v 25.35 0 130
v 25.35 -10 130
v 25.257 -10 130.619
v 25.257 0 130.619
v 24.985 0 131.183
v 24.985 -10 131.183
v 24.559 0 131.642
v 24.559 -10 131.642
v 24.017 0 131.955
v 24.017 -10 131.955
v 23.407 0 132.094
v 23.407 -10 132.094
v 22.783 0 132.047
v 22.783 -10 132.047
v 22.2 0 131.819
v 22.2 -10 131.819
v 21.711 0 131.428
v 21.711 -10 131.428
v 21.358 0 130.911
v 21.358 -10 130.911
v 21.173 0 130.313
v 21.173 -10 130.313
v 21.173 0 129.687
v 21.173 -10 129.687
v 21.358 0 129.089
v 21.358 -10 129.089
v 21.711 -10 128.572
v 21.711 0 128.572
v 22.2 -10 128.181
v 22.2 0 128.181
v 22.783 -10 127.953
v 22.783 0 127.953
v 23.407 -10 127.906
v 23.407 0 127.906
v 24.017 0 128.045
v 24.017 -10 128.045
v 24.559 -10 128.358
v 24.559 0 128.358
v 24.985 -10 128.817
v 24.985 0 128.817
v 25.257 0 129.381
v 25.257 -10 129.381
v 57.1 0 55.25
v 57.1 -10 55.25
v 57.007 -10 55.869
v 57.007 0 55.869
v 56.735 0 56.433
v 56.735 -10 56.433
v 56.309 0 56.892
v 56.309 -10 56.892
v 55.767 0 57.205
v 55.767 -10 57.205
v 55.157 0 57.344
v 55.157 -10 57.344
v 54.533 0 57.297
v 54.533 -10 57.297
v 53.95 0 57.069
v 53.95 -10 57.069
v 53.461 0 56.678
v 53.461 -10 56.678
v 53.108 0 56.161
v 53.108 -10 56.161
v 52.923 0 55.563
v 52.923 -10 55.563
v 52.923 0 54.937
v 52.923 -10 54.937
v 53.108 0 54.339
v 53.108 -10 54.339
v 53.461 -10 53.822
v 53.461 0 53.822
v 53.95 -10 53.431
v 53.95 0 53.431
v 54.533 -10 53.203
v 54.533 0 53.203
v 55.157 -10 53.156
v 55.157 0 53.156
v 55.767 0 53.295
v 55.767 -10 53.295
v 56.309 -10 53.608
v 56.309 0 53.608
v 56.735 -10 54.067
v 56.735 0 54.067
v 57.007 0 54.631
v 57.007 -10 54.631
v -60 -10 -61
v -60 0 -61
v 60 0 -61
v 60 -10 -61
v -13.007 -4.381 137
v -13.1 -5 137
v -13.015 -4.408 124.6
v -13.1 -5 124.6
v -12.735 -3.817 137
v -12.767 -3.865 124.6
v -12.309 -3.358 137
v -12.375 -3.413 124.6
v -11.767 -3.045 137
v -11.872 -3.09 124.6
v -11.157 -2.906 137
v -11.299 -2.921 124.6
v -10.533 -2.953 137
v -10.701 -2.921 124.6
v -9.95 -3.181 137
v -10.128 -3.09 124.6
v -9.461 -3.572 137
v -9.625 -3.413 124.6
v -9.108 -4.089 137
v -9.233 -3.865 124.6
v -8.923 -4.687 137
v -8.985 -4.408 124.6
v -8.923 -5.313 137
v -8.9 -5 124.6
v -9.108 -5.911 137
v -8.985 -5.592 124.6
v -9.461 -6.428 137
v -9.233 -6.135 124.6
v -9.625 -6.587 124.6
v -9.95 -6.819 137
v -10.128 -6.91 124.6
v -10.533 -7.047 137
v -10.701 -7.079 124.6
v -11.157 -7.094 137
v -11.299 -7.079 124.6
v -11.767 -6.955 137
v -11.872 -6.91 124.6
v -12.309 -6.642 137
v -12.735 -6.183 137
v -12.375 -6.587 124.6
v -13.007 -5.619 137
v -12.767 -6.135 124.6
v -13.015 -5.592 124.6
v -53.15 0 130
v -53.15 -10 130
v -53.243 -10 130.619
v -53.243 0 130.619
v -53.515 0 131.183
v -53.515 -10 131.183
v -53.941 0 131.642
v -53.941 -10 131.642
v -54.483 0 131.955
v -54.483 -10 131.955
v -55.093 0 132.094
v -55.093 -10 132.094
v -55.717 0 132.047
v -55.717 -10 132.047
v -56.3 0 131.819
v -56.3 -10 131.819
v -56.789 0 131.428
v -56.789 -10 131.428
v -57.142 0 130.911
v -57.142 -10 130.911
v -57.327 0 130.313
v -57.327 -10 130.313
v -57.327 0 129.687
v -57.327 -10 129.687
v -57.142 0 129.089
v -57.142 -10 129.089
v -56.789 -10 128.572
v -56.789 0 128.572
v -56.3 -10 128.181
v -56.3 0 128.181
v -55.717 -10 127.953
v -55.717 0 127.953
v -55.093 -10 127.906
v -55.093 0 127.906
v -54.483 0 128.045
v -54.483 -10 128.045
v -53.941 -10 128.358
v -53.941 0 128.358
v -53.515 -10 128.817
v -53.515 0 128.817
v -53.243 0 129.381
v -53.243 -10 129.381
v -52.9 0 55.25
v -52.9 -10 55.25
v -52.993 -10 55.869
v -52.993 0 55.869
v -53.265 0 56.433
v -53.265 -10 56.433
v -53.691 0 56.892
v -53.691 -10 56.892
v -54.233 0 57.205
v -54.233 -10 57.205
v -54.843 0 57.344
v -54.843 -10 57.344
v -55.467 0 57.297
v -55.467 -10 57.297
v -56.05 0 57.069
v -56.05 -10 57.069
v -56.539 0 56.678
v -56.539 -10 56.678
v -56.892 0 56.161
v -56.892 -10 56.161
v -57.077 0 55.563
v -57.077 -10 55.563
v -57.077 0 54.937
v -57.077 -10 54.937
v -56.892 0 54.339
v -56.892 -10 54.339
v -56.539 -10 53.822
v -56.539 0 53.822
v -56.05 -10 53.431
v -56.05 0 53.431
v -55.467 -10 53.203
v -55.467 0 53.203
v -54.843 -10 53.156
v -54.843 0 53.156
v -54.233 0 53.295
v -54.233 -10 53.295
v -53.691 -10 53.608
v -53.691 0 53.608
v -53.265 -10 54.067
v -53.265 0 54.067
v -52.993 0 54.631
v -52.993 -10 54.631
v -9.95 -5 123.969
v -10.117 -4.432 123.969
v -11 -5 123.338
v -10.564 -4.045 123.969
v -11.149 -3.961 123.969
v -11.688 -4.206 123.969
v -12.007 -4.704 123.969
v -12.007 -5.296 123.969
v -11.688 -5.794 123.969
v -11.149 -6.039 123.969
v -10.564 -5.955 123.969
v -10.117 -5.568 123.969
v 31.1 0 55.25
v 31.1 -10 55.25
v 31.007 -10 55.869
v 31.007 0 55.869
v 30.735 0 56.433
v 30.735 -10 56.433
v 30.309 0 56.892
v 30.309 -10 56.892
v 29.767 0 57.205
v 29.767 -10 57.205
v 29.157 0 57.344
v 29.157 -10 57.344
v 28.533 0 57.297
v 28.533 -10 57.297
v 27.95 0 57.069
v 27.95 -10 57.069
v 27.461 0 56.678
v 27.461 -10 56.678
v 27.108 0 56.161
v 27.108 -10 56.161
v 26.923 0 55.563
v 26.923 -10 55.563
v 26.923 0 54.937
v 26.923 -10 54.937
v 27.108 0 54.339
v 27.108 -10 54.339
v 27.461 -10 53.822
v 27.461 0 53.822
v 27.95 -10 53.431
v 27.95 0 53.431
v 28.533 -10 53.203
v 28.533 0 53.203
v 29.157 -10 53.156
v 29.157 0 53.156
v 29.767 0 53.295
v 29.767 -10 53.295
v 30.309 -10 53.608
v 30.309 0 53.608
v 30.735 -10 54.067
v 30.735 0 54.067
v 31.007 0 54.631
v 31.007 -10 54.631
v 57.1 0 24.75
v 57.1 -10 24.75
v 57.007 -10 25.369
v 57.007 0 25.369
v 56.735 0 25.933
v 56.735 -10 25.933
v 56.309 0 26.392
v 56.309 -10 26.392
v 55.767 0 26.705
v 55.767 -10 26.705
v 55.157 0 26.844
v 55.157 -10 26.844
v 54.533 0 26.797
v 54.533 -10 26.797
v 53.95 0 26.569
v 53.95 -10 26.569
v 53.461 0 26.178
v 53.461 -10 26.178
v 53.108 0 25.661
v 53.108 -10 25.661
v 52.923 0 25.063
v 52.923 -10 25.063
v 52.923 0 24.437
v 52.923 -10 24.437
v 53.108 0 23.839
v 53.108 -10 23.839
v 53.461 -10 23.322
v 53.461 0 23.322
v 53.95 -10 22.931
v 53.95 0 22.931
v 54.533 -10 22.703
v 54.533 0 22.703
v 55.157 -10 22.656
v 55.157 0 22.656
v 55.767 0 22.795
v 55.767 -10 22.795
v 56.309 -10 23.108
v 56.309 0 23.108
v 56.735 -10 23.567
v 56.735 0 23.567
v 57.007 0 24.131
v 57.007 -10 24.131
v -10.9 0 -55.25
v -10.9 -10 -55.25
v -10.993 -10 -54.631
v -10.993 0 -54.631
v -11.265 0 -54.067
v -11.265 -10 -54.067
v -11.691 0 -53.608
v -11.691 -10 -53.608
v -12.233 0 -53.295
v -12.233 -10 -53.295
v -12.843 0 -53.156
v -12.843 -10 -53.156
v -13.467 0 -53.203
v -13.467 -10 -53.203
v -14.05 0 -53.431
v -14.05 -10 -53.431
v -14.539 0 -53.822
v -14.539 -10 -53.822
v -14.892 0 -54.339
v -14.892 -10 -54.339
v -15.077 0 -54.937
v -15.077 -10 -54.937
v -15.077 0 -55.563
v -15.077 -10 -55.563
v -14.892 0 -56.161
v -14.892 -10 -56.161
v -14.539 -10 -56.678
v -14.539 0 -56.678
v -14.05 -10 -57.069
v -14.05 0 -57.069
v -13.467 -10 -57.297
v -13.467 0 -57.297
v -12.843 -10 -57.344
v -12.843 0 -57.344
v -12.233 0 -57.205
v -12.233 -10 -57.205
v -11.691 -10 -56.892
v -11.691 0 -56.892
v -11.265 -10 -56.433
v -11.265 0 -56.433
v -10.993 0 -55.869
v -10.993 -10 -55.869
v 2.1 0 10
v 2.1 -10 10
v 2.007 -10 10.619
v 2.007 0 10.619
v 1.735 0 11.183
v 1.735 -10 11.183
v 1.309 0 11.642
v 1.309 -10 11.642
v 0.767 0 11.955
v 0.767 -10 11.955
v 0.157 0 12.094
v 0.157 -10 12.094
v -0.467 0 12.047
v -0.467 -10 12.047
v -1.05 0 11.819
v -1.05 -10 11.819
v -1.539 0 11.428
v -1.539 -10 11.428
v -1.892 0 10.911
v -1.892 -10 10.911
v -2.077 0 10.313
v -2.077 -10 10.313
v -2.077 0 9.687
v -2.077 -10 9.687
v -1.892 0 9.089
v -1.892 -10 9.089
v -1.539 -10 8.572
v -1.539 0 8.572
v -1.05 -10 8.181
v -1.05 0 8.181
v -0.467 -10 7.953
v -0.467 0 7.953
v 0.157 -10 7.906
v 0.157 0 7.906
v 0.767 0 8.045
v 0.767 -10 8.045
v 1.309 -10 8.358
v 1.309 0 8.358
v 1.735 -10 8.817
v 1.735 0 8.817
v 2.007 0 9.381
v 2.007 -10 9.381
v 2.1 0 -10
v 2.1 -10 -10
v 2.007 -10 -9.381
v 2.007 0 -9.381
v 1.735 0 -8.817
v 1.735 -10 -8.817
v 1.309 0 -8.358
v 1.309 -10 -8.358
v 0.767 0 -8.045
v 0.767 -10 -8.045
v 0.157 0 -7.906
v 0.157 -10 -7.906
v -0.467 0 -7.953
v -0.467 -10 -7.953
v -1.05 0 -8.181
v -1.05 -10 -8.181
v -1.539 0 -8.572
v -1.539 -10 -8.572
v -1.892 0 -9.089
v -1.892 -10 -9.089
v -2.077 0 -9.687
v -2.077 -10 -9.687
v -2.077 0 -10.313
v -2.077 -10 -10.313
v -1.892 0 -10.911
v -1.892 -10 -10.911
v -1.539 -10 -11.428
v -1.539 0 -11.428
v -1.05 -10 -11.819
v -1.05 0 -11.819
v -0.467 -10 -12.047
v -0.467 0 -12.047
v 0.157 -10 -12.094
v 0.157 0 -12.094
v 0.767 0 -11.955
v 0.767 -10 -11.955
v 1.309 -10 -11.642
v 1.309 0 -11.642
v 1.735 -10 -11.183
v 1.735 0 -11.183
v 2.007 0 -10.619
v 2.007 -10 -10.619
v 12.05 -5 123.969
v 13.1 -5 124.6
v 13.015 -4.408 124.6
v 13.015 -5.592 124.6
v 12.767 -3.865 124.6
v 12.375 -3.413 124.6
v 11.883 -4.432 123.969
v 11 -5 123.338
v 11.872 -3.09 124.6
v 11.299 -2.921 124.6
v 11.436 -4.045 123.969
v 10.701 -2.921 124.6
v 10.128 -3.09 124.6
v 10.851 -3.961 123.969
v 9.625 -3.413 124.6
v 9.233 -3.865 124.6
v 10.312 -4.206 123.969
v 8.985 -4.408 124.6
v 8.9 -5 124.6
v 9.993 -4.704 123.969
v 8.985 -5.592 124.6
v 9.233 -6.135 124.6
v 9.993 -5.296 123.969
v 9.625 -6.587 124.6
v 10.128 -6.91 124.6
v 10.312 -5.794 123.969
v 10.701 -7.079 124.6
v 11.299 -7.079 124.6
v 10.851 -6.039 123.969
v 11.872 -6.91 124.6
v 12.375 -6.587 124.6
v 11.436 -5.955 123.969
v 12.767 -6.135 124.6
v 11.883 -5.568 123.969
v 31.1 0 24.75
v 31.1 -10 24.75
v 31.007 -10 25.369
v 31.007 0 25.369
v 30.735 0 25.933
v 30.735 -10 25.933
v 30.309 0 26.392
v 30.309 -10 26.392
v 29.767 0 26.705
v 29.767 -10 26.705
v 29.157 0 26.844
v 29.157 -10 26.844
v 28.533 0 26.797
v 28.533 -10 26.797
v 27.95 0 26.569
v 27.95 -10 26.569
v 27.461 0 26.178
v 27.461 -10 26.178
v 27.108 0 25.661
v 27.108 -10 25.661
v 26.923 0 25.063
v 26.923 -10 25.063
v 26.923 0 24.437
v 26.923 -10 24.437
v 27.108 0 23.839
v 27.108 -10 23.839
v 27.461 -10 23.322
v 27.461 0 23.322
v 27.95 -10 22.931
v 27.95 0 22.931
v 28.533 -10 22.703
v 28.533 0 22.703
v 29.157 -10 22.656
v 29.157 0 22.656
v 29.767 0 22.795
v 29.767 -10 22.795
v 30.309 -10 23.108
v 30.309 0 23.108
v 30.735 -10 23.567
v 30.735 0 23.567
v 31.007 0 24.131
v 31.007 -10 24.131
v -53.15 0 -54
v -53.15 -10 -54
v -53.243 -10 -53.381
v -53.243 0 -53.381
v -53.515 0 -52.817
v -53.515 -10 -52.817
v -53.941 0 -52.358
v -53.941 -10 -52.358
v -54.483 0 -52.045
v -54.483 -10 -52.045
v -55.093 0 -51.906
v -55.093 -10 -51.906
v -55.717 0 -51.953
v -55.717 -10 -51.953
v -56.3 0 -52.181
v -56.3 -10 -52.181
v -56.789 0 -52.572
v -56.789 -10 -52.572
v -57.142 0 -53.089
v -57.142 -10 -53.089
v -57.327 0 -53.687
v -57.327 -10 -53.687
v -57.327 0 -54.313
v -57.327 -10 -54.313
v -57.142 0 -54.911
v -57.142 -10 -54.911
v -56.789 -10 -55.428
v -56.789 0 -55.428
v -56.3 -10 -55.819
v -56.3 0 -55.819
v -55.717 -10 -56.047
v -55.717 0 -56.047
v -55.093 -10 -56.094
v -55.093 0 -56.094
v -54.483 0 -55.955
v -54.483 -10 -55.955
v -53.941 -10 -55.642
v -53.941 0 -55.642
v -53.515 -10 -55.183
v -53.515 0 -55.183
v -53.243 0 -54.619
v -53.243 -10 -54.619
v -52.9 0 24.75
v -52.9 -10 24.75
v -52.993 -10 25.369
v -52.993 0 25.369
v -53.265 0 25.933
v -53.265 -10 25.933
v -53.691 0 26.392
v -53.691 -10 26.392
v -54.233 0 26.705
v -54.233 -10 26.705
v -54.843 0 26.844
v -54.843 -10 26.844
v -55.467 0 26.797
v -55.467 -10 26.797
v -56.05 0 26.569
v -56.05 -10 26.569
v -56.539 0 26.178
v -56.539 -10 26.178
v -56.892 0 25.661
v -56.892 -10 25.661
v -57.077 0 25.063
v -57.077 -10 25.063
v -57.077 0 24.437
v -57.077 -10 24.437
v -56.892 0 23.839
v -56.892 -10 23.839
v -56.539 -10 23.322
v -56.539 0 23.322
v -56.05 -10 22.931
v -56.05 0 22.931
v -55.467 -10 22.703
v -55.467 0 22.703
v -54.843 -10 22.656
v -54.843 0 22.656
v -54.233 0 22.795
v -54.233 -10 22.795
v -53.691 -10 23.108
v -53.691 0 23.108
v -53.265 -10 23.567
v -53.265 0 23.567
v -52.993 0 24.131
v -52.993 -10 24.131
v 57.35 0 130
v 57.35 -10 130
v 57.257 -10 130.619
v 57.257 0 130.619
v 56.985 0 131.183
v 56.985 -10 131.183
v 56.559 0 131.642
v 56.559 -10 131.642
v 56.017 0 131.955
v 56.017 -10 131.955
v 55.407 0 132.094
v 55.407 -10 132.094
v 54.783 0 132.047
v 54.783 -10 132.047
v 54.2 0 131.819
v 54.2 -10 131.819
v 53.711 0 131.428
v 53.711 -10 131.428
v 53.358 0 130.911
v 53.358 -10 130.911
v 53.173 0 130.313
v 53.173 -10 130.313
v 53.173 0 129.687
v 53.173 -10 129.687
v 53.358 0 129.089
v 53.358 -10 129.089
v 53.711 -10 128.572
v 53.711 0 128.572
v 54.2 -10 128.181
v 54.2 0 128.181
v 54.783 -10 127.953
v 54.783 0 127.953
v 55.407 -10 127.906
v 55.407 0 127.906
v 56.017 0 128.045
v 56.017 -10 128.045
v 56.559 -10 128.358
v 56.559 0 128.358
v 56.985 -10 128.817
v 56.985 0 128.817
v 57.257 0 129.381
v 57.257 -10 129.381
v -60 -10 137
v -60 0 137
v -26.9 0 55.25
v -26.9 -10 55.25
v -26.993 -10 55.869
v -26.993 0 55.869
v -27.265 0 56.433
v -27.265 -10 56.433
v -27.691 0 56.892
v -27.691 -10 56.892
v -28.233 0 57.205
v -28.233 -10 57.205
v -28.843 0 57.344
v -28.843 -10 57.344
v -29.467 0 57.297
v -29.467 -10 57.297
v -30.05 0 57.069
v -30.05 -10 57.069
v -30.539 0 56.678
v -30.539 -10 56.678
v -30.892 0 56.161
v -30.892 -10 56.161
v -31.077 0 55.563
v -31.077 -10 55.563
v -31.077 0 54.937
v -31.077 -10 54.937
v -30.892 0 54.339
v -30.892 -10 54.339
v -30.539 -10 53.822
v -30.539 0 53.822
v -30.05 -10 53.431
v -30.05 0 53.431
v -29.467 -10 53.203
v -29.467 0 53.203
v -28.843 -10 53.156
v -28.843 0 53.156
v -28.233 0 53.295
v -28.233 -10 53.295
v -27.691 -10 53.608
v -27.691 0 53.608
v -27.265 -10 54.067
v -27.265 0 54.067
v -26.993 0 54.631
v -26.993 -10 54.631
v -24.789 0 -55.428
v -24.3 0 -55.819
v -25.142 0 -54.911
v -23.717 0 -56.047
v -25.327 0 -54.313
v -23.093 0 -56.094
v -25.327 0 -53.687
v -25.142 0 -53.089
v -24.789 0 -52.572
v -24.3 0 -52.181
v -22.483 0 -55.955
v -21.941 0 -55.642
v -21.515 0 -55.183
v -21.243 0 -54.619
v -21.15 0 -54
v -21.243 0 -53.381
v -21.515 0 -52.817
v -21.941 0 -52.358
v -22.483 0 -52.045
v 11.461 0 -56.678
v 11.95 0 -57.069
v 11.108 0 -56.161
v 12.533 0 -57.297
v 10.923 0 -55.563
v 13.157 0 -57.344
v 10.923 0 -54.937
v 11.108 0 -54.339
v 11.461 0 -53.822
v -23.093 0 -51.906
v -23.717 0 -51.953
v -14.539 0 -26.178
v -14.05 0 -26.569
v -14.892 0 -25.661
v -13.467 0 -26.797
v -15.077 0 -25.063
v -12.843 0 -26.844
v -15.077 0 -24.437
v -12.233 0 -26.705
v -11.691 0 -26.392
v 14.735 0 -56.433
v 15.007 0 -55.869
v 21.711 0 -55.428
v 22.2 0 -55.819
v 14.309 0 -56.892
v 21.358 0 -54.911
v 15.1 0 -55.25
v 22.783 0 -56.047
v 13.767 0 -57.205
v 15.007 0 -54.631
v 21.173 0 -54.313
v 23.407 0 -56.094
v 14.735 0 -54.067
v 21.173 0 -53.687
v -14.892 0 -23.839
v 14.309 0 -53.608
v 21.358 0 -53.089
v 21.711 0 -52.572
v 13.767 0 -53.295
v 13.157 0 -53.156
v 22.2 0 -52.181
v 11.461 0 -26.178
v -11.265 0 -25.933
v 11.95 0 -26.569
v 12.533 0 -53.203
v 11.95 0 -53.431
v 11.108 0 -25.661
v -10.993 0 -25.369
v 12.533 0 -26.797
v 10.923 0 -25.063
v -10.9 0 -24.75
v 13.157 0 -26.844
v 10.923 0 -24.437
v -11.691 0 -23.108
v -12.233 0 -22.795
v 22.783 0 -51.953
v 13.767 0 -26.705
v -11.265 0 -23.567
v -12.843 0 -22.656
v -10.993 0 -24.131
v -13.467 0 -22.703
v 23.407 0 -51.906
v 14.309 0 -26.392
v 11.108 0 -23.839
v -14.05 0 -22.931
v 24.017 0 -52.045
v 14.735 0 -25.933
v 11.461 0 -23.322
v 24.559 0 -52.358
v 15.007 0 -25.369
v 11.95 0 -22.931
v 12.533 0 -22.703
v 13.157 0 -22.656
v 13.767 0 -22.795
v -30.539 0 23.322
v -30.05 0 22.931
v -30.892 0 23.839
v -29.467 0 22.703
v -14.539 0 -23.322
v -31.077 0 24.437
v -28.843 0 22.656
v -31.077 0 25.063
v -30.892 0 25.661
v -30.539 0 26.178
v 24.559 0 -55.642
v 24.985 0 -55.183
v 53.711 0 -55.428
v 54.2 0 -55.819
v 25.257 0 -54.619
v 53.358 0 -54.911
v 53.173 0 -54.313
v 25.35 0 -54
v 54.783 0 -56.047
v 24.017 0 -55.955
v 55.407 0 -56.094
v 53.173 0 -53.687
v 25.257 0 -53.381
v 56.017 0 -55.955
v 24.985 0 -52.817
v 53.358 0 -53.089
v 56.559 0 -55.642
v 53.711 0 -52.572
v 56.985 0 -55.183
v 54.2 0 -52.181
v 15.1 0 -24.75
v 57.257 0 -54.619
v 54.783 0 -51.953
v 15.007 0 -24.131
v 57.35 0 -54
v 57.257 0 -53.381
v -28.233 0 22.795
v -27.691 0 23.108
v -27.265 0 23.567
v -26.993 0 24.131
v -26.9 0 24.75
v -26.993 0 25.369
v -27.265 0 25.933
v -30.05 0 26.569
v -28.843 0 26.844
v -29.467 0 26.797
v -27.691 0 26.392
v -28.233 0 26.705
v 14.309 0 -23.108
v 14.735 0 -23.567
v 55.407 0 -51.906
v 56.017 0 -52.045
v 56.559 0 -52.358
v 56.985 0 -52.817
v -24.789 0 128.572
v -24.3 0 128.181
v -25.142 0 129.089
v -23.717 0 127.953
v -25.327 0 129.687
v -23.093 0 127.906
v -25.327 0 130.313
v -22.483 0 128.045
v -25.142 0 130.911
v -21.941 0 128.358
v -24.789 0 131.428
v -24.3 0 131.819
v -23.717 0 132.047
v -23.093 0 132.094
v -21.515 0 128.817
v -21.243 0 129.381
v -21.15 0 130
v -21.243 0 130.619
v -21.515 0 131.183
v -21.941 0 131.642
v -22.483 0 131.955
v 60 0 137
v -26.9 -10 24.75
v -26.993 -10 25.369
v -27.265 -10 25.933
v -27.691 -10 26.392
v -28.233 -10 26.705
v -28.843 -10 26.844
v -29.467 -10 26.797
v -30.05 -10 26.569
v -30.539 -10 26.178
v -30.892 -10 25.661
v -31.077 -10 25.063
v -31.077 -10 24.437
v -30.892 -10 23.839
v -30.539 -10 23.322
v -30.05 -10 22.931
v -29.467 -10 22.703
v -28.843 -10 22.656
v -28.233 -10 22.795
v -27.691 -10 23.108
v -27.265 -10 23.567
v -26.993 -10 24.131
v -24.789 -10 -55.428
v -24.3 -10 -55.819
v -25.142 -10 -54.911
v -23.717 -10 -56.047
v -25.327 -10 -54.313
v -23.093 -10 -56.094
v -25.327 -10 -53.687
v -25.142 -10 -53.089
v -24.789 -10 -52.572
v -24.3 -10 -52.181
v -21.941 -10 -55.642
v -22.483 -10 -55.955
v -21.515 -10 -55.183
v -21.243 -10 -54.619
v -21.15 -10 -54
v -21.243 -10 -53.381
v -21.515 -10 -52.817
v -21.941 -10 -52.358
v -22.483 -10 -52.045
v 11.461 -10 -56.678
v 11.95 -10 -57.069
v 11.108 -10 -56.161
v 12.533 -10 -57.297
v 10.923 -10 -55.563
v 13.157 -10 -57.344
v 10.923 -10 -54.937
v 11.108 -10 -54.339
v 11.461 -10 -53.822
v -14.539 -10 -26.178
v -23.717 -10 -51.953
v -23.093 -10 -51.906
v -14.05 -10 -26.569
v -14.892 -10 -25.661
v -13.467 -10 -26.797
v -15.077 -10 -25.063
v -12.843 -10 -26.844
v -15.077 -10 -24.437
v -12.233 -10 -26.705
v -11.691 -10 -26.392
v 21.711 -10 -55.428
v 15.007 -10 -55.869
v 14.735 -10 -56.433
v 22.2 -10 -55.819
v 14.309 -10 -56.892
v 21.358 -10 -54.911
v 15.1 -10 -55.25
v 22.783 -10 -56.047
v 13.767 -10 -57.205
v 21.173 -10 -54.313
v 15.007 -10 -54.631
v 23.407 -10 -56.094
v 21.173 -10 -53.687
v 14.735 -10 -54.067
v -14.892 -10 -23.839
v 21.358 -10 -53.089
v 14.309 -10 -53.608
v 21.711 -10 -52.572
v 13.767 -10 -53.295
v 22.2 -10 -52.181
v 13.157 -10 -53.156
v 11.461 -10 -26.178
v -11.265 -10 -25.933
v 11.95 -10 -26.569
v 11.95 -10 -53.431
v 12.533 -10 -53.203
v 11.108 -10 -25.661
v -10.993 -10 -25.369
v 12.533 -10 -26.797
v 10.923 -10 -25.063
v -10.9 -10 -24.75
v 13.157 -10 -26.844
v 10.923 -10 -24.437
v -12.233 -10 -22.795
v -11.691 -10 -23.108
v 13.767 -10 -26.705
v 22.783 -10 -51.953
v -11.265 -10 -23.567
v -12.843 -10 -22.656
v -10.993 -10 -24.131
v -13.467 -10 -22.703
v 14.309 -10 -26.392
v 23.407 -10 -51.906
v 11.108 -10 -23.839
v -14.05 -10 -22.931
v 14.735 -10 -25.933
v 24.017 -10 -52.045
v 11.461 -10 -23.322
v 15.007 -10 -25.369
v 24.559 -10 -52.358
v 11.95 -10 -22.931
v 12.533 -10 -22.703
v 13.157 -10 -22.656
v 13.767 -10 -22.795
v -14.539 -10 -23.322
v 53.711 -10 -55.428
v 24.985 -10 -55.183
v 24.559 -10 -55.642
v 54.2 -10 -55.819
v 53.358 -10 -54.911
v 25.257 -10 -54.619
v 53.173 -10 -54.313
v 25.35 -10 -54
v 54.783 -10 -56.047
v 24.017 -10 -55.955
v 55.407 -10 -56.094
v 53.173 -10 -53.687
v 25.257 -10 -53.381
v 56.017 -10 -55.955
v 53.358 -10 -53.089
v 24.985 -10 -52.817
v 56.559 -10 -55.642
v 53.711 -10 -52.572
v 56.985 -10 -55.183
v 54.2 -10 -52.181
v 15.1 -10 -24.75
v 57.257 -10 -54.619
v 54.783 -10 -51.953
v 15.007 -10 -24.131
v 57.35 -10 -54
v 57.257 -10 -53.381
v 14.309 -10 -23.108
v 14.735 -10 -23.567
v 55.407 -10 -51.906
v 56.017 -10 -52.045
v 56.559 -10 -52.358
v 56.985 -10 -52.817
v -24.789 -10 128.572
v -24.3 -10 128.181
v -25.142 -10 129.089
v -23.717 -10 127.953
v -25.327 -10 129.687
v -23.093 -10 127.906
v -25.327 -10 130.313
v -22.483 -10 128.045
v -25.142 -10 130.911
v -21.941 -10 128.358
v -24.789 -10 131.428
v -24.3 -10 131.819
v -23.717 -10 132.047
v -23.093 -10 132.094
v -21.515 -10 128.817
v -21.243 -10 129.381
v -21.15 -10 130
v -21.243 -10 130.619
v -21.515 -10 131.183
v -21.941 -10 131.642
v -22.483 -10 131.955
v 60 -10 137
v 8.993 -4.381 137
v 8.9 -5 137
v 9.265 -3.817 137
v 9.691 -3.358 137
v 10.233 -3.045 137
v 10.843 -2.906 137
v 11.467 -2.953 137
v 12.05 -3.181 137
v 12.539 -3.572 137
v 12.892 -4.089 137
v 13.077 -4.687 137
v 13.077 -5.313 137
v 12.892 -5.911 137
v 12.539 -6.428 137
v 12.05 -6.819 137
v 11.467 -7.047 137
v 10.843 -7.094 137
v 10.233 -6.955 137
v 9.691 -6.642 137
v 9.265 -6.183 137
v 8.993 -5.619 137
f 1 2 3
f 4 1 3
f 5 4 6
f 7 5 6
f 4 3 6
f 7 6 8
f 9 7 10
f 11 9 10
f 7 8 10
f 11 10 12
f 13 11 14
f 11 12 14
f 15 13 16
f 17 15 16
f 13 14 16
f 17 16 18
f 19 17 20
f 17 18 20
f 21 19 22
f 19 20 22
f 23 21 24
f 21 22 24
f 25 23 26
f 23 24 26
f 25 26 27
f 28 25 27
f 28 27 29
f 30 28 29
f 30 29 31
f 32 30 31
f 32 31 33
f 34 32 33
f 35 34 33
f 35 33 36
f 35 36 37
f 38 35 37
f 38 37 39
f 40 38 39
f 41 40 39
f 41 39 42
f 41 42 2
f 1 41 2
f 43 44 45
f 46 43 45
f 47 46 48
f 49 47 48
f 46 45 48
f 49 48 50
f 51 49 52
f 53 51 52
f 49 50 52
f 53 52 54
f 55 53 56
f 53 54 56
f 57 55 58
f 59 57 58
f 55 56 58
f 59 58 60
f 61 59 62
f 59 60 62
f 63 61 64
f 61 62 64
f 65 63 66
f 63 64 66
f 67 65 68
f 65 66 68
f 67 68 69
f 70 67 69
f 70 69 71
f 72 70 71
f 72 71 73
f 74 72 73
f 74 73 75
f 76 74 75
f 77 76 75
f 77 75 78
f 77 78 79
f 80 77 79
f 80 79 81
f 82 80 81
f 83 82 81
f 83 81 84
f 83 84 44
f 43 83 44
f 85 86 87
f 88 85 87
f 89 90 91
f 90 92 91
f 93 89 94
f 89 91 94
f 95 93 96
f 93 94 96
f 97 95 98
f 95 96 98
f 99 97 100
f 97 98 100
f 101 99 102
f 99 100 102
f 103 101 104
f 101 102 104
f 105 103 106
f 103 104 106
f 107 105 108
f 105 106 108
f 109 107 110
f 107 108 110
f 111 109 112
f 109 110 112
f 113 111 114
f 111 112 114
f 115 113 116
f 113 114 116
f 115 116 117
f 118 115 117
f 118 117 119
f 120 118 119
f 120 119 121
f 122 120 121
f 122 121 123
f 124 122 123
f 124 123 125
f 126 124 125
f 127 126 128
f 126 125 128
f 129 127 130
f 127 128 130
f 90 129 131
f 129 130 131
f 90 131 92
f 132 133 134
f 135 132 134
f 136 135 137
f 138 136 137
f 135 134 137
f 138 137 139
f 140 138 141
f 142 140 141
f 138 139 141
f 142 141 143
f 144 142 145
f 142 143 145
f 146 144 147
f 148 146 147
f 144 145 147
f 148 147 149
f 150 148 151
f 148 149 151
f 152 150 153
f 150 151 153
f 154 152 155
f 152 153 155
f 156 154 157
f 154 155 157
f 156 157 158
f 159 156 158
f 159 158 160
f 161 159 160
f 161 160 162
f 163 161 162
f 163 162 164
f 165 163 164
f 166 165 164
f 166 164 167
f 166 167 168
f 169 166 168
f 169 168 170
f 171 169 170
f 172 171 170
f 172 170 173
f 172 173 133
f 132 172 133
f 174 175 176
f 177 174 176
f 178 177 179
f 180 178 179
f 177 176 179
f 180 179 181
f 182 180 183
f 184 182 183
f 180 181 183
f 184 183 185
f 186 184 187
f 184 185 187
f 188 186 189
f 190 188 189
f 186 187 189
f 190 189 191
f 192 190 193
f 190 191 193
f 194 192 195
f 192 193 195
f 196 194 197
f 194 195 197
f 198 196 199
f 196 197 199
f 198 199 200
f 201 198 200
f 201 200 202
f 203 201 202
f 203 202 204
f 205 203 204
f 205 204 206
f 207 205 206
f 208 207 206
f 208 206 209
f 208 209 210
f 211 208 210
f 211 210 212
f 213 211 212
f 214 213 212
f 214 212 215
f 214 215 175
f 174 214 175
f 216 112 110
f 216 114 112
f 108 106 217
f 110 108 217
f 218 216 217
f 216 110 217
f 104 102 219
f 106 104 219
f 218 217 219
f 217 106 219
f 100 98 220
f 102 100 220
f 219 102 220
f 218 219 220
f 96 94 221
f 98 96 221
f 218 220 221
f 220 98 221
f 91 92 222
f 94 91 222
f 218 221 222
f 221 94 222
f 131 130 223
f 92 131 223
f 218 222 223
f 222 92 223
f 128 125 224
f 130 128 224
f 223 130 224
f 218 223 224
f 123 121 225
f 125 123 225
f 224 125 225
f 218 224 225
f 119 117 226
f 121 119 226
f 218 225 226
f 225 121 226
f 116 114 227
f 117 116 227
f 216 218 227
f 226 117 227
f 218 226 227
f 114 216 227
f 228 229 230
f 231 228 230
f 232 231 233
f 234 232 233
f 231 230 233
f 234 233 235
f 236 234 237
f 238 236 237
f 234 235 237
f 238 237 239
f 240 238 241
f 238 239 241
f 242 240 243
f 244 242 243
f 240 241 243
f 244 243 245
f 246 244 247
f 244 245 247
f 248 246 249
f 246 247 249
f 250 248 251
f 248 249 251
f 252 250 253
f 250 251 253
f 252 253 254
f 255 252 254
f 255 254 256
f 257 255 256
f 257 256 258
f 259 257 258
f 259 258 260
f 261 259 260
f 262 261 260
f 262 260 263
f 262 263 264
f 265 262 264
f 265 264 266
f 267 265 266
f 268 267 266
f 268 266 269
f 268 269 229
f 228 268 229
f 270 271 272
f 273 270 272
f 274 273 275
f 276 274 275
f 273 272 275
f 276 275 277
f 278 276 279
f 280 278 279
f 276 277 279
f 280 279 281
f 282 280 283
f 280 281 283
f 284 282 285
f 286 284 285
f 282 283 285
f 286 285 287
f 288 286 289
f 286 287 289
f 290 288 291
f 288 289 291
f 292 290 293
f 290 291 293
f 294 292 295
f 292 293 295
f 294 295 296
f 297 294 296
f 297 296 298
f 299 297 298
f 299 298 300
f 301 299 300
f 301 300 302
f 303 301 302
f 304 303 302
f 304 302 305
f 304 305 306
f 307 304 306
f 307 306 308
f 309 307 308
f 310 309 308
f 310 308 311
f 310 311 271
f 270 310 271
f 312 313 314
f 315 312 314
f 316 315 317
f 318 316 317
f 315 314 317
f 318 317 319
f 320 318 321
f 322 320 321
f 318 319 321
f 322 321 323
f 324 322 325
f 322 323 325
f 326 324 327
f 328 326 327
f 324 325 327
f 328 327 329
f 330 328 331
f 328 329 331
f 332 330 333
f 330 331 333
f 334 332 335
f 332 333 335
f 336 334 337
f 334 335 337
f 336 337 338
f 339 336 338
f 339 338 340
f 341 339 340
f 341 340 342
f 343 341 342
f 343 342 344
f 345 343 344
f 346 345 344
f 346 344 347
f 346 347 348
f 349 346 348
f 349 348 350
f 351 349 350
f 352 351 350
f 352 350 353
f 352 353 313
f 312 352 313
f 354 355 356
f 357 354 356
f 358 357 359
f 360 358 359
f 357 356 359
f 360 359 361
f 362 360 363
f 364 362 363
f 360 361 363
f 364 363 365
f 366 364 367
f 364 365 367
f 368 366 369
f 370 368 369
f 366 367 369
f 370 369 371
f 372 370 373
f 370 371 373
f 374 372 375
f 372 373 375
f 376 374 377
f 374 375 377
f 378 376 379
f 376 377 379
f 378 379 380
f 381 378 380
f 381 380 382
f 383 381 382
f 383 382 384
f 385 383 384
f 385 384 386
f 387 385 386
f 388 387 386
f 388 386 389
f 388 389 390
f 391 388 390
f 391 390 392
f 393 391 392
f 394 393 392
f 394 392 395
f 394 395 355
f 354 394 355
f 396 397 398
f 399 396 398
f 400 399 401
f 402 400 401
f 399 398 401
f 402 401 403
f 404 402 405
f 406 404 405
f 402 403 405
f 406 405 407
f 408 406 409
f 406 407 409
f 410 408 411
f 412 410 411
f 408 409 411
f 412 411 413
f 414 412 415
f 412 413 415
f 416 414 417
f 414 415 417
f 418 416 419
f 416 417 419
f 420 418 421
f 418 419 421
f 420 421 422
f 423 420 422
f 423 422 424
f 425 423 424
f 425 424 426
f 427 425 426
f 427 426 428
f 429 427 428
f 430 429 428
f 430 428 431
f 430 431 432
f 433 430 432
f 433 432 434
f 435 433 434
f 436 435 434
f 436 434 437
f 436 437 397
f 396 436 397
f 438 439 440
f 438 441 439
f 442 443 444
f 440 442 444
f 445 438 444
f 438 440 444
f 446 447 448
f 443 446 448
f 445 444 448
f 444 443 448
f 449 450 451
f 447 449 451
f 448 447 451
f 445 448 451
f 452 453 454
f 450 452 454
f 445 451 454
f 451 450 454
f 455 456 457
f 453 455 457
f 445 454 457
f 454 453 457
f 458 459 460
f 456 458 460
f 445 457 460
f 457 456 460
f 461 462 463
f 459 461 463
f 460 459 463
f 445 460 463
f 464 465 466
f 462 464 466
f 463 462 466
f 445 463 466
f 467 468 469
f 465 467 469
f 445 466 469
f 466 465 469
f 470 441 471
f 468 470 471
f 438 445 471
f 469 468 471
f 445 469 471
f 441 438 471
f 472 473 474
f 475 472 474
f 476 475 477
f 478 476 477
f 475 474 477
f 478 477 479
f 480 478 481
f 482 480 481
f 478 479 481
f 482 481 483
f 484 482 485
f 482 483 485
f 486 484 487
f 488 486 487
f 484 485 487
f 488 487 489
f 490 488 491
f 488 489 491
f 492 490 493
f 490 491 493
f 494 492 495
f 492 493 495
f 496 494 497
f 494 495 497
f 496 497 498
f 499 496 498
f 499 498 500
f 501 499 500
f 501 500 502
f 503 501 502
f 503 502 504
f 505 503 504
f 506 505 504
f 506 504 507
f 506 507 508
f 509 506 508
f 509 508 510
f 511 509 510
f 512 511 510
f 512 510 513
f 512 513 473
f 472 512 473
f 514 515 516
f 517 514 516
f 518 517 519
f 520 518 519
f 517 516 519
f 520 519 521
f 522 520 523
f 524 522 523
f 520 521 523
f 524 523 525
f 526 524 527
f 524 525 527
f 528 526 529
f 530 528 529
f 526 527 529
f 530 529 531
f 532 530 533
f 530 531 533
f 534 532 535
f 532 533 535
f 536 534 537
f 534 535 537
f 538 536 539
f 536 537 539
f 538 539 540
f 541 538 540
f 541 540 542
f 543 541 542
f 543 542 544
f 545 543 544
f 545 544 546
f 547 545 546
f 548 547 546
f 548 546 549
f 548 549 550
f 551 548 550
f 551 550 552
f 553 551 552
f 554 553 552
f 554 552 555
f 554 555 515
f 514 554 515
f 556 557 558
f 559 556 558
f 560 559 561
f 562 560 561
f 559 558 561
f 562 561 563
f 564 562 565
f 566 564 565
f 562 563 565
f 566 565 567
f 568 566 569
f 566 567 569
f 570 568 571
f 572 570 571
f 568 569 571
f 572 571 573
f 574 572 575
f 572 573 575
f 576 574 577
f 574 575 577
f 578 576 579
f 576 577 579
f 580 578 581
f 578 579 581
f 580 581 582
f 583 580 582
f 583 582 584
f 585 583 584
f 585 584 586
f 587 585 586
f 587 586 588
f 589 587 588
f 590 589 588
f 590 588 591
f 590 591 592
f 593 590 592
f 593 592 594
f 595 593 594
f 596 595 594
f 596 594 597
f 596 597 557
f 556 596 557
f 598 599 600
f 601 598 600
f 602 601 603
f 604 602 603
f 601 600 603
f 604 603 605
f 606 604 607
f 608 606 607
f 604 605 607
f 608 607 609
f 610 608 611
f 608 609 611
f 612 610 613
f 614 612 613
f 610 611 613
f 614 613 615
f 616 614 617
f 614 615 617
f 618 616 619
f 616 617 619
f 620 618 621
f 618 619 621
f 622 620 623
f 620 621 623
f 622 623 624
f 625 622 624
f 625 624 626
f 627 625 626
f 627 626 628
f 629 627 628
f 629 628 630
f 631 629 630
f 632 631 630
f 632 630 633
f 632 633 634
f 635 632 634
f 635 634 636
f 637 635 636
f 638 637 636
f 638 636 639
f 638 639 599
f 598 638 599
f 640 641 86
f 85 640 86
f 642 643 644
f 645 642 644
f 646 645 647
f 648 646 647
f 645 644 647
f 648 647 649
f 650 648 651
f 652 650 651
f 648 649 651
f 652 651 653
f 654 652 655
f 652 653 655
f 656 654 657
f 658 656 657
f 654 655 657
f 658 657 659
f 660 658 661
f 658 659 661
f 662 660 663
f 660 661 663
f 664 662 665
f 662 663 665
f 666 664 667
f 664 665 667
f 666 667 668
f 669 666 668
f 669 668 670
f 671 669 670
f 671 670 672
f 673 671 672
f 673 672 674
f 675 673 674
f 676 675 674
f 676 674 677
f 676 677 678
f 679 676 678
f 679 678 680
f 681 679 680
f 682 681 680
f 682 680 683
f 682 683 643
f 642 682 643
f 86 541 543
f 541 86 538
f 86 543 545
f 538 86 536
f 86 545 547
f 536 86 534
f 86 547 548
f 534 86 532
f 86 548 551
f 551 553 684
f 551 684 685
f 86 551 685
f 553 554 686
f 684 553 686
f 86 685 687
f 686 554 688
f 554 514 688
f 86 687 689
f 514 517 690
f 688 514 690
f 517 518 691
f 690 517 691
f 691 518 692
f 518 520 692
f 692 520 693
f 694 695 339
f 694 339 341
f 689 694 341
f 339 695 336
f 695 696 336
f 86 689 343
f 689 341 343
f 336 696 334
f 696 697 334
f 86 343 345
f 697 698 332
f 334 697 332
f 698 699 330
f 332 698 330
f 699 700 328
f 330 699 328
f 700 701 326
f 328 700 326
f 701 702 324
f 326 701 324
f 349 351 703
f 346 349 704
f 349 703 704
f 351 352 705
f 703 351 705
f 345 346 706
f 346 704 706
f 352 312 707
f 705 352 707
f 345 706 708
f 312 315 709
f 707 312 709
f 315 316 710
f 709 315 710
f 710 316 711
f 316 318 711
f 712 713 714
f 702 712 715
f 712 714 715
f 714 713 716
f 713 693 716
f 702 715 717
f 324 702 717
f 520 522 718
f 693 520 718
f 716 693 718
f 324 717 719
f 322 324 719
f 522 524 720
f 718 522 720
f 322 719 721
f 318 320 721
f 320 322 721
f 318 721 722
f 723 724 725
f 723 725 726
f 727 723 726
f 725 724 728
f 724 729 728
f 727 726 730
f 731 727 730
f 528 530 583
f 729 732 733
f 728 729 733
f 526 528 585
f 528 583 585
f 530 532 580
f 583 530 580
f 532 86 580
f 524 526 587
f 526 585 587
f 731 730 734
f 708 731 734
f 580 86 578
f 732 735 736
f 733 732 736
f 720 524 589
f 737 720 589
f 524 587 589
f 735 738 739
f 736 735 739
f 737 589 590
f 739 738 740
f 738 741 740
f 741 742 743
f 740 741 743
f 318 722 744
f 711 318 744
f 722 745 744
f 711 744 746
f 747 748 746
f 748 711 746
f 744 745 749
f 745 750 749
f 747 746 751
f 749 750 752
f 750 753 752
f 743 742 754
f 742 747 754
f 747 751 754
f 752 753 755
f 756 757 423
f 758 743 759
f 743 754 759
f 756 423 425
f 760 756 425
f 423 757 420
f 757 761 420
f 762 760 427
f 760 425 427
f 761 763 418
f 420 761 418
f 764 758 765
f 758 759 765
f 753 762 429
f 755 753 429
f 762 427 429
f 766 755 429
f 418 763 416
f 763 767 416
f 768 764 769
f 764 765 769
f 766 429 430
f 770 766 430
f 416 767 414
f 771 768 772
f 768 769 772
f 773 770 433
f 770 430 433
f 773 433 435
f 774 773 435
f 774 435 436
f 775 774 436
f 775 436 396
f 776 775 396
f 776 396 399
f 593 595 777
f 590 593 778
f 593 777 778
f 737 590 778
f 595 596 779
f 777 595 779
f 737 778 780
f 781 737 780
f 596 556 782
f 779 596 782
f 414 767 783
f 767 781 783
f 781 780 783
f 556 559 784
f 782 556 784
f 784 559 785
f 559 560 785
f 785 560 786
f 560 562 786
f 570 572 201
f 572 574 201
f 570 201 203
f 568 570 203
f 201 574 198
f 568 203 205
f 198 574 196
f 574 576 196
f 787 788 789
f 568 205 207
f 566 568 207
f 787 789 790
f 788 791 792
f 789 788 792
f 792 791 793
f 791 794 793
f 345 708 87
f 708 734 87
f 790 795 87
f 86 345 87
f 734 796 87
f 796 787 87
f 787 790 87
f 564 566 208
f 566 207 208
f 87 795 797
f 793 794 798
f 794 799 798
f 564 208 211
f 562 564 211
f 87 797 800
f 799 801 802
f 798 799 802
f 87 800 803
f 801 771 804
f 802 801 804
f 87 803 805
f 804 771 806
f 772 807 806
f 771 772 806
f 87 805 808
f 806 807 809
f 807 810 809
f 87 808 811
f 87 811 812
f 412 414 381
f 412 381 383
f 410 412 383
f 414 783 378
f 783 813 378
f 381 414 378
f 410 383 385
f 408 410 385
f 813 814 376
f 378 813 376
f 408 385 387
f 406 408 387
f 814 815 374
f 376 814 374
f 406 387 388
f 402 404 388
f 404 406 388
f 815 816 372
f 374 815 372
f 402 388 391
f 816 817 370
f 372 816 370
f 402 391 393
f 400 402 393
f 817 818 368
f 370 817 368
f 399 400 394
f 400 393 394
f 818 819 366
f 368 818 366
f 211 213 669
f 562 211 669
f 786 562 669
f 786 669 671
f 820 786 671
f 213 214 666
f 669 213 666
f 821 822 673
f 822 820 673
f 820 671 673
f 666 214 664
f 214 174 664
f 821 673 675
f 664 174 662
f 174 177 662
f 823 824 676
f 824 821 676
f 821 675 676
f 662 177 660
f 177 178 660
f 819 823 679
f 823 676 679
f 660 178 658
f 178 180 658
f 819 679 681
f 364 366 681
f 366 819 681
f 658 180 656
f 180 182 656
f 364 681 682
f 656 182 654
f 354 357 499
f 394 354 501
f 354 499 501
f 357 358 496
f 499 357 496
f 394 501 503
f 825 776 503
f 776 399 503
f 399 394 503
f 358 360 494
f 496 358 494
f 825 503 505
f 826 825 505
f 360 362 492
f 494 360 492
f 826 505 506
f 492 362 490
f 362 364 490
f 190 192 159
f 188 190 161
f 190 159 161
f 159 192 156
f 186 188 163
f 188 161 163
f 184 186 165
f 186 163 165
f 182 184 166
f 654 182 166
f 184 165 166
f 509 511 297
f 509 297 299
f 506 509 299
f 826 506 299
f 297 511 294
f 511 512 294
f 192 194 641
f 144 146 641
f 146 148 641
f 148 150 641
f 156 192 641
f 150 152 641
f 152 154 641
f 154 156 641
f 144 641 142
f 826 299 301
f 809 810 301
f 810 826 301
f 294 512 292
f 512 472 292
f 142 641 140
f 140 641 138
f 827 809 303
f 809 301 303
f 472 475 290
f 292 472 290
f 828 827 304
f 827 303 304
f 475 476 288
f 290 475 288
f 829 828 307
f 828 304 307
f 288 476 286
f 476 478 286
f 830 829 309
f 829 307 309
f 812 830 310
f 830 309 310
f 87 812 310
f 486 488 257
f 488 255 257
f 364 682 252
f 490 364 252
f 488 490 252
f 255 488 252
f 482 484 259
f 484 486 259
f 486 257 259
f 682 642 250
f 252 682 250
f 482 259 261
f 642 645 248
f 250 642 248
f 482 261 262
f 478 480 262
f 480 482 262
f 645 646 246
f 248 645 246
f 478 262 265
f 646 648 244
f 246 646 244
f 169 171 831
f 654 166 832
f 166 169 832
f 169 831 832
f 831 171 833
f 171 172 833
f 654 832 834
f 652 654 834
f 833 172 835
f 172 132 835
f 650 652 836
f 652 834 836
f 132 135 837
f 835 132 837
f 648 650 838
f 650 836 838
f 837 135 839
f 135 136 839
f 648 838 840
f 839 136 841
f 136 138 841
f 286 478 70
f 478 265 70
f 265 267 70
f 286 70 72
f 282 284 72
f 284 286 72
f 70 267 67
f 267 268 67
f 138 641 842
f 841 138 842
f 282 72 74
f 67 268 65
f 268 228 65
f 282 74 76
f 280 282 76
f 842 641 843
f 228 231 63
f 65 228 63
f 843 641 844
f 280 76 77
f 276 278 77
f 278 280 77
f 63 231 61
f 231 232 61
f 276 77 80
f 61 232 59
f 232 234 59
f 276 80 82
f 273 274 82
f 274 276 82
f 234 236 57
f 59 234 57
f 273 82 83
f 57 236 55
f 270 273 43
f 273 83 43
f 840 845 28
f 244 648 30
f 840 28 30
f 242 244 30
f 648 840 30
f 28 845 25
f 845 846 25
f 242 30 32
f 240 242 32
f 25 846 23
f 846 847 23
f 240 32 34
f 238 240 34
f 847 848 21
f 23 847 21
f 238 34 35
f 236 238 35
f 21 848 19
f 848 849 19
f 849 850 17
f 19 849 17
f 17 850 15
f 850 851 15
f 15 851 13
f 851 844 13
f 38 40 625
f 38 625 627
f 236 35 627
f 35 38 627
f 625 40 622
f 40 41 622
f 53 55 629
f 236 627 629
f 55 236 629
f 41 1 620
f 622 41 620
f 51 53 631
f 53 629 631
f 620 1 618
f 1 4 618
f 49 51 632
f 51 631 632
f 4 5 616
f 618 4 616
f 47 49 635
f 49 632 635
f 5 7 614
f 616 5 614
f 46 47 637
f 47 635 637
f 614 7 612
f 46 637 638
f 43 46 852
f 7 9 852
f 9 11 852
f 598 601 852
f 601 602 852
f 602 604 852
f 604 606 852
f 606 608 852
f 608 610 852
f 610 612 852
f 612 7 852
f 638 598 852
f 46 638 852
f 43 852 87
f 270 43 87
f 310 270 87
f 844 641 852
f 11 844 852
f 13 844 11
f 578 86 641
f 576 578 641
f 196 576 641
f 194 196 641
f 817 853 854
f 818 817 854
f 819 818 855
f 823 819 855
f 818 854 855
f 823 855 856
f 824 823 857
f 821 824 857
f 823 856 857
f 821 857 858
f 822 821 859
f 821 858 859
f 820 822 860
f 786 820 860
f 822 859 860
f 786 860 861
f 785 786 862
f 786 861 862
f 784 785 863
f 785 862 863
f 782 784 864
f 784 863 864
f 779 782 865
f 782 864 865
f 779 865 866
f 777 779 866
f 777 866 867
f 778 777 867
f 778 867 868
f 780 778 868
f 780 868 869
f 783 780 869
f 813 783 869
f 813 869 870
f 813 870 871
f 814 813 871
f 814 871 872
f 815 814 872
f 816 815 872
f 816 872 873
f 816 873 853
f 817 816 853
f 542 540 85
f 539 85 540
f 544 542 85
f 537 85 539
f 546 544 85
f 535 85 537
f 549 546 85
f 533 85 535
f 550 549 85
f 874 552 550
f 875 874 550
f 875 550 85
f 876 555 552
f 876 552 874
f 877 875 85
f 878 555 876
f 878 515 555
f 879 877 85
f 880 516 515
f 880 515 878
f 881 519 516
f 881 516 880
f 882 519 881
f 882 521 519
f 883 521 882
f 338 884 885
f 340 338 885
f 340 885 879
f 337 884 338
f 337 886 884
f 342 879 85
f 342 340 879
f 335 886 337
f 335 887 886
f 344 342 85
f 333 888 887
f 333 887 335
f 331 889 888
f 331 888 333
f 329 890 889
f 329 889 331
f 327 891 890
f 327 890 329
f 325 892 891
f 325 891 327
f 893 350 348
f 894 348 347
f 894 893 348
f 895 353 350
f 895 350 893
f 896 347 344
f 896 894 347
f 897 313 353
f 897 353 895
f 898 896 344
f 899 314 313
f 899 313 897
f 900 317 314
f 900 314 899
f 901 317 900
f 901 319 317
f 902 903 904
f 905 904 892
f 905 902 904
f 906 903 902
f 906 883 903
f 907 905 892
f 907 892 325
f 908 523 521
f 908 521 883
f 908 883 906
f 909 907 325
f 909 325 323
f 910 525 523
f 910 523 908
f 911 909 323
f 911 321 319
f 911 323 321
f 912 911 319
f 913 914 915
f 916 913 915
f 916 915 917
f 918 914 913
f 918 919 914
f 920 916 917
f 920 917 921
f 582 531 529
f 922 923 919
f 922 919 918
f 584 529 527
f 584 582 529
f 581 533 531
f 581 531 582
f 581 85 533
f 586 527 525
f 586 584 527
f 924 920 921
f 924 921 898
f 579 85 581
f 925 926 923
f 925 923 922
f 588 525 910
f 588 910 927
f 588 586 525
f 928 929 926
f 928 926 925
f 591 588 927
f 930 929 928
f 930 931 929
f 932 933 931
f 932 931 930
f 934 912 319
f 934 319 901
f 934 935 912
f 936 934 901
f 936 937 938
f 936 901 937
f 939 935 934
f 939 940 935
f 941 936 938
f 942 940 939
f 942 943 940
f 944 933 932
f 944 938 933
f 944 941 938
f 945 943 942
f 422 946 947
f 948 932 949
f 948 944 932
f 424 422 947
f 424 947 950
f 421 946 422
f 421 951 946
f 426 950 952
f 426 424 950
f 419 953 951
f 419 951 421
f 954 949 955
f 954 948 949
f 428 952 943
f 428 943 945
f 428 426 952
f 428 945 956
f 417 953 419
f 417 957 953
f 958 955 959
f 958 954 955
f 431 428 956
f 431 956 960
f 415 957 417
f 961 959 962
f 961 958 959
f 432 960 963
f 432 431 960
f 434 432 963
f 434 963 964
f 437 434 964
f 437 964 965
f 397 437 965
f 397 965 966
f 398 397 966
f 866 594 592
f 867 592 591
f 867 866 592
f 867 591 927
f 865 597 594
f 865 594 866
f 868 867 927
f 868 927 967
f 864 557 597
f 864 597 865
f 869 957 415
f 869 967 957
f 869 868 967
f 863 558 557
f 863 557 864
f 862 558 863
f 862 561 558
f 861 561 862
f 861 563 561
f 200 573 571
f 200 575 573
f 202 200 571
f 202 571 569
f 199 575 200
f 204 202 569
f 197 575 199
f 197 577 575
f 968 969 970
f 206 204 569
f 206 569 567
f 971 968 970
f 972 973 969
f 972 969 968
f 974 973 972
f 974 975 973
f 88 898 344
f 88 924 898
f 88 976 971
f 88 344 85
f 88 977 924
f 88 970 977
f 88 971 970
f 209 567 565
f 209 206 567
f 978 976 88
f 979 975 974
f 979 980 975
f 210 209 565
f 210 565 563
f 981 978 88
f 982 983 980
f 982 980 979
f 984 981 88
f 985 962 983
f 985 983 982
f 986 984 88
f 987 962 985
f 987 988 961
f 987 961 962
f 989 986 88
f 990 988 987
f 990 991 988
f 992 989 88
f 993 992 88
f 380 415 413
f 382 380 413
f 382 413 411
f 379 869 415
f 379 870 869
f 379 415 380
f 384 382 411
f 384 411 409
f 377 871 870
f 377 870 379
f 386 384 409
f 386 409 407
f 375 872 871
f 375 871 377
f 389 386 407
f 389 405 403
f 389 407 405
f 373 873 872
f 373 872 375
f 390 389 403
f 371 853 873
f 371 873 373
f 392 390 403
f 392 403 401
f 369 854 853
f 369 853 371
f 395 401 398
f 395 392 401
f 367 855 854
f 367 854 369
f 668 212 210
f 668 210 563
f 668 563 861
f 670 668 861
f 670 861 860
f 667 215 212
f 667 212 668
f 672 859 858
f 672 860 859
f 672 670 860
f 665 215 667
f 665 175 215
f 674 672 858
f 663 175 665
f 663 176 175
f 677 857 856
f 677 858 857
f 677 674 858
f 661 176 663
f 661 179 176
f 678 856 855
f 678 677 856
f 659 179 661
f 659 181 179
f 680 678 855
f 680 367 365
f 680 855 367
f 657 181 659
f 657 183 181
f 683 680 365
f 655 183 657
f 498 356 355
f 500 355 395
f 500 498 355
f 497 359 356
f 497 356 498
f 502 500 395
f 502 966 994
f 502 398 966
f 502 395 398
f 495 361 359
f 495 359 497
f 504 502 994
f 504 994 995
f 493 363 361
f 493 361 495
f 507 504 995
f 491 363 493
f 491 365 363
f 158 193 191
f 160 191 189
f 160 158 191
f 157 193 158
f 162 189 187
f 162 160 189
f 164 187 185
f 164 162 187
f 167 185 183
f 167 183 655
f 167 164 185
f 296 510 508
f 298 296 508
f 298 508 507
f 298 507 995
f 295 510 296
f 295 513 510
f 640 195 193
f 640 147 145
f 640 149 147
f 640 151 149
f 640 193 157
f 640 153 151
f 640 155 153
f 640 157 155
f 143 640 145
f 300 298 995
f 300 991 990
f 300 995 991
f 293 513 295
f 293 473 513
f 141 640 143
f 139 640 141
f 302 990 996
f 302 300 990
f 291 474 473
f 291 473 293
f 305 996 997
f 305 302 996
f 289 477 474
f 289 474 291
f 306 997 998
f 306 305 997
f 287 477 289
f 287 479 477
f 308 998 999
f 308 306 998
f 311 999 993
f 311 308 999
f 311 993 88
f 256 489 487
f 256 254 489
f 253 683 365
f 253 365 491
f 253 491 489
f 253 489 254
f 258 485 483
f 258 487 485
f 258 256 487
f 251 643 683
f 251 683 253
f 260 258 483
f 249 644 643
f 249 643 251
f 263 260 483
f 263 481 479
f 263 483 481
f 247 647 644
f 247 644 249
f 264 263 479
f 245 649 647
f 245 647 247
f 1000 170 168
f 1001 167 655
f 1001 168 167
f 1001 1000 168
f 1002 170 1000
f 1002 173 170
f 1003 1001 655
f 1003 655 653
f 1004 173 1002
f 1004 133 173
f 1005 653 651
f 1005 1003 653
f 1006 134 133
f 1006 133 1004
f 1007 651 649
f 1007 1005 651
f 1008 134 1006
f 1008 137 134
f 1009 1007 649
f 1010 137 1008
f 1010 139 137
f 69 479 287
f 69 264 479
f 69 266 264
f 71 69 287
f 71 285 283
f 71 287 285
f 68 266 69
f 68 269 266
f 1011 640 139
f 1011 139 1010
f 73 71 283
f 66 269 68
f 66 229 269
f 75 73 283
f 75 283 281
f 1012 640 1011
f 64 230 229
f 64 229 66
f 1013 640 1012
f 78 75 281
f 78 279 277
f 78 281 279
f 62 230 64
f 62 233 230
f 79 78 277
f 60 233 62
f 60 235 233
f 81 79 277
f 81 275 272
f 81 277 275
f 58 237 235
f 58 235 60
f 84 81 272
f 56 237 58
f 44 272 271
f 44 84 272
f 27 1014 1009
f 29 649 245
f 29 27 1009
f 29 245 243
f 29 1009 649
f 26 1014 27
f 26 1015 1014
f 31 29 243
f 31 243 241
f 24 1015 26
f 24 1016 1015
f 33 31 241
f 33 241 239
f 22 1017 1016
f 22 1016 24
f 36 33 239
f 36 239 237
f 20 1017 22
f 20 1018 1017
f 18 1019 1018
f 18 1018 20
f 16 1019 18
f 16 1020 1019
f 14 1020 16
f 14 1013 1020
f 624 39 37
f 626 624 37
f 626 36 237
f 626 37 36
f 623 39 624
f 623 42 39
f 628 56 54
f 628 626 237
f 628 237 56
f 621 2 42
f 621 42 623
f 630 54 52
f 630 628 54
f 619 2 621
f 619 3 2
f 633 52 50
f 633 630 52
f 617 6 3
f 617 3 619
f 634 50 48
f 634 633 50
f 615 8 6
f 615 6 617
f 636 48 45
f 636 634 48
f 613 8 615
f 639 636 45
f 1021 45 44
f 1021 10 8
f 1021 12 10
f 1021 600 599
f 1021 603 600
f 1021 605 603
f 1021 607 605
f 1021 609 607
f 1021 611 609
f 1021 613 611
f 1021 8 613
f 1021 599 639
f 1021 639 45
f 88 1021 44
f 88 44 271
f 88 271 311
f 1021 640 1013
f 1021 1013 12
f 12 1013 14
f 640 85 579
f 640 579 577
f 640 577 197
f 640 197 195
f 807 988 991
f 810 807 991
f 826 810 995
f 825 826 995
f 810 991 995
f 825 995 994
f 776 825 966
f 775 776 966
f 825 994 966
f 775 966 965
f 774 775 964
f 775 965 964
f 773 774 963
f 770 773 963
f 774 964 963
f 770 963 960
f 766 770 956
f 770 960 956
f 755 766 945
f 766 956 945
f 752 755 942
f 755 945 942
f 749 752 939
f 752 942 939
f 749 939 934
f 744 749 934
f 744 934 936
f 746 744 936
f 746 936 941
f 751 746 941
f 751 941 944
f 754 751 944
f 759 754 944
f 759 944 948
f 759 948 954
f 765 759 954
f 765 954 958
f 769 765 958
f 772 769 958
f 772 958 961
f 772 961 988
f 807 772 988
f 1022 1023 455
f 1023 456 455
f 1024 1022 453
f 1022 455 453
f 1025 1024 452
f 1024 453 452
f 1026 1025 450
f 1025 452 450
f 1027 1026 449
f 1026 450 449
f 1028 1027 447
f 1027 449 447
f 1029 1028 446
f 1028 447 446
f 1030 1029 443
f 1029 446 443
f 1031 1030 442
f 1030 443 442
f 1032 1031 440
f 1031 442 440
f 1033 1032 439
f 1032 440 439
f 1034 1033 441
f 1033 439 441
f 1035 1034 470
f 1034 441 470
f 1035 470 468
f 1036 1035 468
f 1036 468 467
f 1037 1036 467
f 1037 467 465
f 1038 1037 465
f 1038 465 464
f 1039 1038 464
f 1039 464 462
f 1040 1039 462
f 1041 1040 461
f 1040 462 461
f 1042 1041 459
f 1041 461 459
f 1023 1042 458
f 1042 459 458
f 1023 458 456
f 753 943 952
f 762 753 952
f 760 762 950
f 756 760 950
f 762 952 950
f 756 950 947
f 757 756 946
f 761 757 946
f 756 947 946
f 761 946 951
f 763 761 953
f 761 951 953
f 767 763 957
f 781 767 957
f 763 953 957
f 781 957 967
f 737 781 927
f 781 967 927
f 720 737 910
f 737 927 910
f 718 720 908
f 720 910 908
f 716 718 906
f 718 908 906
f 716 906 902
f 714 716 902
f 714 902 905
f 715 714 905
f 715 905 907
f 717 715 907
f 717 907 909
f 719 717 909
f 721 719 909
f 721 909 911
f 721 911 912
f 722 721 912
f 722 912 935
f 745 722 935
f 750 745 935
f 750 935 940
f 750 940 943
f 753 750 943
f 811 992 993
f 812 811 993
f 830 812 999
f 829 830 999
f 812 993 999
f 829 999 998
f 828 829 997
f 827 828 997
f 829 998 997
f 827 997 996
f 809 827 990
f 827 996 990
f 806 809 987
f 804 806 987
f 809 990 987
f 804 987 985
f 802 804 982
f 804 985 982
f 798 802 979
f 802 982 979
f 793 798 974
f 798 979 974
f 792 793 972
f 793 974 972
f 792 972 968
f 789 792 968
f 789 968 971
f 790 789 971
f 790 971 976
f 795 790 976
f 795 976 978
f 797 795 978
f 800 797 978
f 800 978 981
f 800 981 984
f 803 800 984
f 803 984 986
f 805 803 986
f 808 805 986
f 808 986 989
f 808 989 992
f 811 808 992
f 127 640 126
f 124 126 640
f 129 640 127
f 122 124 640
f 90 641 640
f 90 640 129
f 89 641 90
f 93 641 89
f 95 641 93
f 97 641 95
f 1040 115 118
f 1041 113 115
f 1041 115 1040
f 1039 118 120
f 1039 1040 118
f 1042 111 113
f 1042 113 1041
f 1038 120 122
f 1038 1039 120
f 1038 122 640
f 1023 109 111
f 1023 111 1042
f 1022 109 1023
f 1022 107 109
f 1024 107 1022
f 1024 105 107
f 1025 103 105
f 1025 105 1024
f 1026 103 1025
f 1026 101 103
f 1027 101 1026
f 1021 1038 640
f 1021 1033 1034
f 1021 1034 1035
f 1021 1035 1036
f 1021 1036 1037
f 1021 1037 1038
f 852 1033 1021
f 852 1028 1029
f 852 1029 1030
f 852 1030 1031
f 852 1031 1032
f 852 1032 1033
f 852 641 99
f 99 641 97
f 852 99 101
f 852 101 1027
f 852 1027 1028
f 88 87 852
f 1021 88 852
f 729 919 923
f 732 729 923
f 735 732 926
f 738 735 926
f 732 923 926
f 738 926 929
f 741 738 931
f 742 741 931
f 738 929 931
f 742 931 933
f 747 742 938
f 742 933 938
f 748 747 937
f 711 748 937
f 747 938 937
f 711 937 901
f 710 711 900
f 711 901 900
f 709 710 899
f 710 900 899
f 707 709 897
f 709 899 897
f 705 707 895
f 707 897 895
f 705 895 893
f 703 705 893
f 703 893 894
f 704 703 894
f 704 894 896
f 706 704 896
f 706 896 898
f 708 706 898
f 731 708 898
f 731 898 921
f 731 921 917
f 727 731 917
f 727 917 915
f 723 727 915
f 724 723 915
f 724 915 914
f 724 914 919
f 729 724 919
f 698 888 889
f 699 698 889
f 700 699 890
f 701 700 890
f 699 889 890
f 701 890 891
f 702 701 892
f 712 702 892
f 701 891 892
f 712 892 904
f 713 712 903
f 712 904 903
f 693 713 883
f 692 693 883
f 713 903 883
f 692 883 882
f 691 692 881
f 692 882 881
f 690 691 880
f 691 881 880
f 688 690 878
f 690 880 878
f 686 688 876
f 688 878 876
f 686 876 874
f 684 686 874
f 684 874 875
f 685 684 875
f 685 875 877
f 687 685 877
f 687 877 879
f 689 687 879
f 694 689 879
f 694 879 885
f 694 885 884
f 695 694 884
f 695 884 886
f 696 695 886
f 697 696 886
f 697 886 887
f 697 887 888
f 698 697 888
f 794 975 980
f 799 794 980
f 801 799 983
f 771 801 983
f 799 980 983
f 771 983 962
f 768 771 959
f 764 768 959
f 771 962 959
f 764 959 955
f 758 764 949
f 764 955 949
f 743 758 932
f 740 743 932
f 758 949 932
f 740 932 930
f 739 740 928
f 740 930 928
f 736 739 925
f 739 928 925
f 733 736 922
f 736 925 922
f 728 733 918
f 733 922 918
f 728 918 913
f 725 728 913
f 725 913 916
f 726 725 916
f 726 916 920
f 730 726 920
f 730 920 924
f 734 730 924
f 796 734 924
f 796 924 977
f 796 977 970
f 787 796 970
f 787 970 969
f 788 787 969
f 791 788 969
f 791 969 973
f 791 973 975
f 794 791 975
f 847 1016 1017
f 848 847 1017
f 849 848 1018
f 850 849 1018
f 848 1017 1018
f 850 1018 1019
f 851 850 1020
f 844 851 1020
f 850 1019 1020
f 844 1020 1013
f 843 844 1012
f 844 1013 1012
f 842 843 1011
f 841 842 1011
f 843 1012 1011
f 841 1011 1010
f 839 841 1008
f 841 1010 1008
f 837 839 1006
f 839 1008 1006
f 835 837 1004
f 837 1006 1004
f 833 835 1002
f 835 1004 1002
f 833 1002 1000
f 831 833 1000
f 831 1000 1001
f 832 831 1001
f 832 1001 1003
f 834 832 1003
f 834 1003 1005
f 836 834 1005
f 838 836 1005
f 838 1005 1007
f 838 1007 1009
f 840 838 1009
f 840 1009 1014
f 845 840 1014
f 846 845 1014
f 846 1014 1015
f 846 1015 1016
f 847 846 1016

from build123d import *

# Parameters (mm, degrees)
F0_W     = 120
F0_H     = 122
F0_H_2   = 76
F1_DEPTH = 10
F3_D     = 4.2
F5_D     = 4.2
F7_D     = 4.2
F7_DEPTH = 12.4
F7_TIP   = 1.2618073


# Not quite as in the source:
# - a feature names something its author has since deleted; it is built from what else it names


with BuildPart() as f1:
    # F0 (on Front) → F1 (new body)
    with BuildSketch(Plane.XZ):
        Rectangle(F0_W, F0_H)
        with Locations((0, 99)):
            Rectangle(F0_W, F0_H_2)
    extrude(amount=F1_DEPTH)

    # F3 (through all)
    with Locations(Plane(origin=(0, 0, 0), x_dir=(-1, 0, 0), z_dir=(0, 1, 0))):
        with Locations((-55, 55.25), (-29, 55.25), (-29, 24.75), (-55, 24.75), (29, 55.25), (55, 55.25), (55, 24.75), (29, 24.75), (-13, -24.75), (13, -24.75), (13, -55.25), (-13, -55.25), (0, 10), (0, -10)):
            Hole(F3_D / 2)

    # F5 (through all)
    with Locations(Plane(origin=(0, 0, 0), x_dir=(-1, 0, 0), z_dir=(0, 1, 0))):
        with Locations((-55.25, 130), (-23.25, 130), (23.25, 130), (55.25, 130), (-55.25, -54), (-23.25, -54), (23.25, -54), (55.25, -54)):
            Hole(F5_D / 2)

    # F7
    with Locations(Plane.XY.offset(137)):
        with Locations((11, -5), (-11, -5)):
            Hole(F7_D / 2, depth=F7_DEPTH)
            with Locations((0, 0, -(F7_DEPTH + F7_TIP / 2))):  # 118° drill point
                Cone(0, F7_D / 2, F7_TIP, mode=Mode.SUBTRACT)


solid = f1.part
